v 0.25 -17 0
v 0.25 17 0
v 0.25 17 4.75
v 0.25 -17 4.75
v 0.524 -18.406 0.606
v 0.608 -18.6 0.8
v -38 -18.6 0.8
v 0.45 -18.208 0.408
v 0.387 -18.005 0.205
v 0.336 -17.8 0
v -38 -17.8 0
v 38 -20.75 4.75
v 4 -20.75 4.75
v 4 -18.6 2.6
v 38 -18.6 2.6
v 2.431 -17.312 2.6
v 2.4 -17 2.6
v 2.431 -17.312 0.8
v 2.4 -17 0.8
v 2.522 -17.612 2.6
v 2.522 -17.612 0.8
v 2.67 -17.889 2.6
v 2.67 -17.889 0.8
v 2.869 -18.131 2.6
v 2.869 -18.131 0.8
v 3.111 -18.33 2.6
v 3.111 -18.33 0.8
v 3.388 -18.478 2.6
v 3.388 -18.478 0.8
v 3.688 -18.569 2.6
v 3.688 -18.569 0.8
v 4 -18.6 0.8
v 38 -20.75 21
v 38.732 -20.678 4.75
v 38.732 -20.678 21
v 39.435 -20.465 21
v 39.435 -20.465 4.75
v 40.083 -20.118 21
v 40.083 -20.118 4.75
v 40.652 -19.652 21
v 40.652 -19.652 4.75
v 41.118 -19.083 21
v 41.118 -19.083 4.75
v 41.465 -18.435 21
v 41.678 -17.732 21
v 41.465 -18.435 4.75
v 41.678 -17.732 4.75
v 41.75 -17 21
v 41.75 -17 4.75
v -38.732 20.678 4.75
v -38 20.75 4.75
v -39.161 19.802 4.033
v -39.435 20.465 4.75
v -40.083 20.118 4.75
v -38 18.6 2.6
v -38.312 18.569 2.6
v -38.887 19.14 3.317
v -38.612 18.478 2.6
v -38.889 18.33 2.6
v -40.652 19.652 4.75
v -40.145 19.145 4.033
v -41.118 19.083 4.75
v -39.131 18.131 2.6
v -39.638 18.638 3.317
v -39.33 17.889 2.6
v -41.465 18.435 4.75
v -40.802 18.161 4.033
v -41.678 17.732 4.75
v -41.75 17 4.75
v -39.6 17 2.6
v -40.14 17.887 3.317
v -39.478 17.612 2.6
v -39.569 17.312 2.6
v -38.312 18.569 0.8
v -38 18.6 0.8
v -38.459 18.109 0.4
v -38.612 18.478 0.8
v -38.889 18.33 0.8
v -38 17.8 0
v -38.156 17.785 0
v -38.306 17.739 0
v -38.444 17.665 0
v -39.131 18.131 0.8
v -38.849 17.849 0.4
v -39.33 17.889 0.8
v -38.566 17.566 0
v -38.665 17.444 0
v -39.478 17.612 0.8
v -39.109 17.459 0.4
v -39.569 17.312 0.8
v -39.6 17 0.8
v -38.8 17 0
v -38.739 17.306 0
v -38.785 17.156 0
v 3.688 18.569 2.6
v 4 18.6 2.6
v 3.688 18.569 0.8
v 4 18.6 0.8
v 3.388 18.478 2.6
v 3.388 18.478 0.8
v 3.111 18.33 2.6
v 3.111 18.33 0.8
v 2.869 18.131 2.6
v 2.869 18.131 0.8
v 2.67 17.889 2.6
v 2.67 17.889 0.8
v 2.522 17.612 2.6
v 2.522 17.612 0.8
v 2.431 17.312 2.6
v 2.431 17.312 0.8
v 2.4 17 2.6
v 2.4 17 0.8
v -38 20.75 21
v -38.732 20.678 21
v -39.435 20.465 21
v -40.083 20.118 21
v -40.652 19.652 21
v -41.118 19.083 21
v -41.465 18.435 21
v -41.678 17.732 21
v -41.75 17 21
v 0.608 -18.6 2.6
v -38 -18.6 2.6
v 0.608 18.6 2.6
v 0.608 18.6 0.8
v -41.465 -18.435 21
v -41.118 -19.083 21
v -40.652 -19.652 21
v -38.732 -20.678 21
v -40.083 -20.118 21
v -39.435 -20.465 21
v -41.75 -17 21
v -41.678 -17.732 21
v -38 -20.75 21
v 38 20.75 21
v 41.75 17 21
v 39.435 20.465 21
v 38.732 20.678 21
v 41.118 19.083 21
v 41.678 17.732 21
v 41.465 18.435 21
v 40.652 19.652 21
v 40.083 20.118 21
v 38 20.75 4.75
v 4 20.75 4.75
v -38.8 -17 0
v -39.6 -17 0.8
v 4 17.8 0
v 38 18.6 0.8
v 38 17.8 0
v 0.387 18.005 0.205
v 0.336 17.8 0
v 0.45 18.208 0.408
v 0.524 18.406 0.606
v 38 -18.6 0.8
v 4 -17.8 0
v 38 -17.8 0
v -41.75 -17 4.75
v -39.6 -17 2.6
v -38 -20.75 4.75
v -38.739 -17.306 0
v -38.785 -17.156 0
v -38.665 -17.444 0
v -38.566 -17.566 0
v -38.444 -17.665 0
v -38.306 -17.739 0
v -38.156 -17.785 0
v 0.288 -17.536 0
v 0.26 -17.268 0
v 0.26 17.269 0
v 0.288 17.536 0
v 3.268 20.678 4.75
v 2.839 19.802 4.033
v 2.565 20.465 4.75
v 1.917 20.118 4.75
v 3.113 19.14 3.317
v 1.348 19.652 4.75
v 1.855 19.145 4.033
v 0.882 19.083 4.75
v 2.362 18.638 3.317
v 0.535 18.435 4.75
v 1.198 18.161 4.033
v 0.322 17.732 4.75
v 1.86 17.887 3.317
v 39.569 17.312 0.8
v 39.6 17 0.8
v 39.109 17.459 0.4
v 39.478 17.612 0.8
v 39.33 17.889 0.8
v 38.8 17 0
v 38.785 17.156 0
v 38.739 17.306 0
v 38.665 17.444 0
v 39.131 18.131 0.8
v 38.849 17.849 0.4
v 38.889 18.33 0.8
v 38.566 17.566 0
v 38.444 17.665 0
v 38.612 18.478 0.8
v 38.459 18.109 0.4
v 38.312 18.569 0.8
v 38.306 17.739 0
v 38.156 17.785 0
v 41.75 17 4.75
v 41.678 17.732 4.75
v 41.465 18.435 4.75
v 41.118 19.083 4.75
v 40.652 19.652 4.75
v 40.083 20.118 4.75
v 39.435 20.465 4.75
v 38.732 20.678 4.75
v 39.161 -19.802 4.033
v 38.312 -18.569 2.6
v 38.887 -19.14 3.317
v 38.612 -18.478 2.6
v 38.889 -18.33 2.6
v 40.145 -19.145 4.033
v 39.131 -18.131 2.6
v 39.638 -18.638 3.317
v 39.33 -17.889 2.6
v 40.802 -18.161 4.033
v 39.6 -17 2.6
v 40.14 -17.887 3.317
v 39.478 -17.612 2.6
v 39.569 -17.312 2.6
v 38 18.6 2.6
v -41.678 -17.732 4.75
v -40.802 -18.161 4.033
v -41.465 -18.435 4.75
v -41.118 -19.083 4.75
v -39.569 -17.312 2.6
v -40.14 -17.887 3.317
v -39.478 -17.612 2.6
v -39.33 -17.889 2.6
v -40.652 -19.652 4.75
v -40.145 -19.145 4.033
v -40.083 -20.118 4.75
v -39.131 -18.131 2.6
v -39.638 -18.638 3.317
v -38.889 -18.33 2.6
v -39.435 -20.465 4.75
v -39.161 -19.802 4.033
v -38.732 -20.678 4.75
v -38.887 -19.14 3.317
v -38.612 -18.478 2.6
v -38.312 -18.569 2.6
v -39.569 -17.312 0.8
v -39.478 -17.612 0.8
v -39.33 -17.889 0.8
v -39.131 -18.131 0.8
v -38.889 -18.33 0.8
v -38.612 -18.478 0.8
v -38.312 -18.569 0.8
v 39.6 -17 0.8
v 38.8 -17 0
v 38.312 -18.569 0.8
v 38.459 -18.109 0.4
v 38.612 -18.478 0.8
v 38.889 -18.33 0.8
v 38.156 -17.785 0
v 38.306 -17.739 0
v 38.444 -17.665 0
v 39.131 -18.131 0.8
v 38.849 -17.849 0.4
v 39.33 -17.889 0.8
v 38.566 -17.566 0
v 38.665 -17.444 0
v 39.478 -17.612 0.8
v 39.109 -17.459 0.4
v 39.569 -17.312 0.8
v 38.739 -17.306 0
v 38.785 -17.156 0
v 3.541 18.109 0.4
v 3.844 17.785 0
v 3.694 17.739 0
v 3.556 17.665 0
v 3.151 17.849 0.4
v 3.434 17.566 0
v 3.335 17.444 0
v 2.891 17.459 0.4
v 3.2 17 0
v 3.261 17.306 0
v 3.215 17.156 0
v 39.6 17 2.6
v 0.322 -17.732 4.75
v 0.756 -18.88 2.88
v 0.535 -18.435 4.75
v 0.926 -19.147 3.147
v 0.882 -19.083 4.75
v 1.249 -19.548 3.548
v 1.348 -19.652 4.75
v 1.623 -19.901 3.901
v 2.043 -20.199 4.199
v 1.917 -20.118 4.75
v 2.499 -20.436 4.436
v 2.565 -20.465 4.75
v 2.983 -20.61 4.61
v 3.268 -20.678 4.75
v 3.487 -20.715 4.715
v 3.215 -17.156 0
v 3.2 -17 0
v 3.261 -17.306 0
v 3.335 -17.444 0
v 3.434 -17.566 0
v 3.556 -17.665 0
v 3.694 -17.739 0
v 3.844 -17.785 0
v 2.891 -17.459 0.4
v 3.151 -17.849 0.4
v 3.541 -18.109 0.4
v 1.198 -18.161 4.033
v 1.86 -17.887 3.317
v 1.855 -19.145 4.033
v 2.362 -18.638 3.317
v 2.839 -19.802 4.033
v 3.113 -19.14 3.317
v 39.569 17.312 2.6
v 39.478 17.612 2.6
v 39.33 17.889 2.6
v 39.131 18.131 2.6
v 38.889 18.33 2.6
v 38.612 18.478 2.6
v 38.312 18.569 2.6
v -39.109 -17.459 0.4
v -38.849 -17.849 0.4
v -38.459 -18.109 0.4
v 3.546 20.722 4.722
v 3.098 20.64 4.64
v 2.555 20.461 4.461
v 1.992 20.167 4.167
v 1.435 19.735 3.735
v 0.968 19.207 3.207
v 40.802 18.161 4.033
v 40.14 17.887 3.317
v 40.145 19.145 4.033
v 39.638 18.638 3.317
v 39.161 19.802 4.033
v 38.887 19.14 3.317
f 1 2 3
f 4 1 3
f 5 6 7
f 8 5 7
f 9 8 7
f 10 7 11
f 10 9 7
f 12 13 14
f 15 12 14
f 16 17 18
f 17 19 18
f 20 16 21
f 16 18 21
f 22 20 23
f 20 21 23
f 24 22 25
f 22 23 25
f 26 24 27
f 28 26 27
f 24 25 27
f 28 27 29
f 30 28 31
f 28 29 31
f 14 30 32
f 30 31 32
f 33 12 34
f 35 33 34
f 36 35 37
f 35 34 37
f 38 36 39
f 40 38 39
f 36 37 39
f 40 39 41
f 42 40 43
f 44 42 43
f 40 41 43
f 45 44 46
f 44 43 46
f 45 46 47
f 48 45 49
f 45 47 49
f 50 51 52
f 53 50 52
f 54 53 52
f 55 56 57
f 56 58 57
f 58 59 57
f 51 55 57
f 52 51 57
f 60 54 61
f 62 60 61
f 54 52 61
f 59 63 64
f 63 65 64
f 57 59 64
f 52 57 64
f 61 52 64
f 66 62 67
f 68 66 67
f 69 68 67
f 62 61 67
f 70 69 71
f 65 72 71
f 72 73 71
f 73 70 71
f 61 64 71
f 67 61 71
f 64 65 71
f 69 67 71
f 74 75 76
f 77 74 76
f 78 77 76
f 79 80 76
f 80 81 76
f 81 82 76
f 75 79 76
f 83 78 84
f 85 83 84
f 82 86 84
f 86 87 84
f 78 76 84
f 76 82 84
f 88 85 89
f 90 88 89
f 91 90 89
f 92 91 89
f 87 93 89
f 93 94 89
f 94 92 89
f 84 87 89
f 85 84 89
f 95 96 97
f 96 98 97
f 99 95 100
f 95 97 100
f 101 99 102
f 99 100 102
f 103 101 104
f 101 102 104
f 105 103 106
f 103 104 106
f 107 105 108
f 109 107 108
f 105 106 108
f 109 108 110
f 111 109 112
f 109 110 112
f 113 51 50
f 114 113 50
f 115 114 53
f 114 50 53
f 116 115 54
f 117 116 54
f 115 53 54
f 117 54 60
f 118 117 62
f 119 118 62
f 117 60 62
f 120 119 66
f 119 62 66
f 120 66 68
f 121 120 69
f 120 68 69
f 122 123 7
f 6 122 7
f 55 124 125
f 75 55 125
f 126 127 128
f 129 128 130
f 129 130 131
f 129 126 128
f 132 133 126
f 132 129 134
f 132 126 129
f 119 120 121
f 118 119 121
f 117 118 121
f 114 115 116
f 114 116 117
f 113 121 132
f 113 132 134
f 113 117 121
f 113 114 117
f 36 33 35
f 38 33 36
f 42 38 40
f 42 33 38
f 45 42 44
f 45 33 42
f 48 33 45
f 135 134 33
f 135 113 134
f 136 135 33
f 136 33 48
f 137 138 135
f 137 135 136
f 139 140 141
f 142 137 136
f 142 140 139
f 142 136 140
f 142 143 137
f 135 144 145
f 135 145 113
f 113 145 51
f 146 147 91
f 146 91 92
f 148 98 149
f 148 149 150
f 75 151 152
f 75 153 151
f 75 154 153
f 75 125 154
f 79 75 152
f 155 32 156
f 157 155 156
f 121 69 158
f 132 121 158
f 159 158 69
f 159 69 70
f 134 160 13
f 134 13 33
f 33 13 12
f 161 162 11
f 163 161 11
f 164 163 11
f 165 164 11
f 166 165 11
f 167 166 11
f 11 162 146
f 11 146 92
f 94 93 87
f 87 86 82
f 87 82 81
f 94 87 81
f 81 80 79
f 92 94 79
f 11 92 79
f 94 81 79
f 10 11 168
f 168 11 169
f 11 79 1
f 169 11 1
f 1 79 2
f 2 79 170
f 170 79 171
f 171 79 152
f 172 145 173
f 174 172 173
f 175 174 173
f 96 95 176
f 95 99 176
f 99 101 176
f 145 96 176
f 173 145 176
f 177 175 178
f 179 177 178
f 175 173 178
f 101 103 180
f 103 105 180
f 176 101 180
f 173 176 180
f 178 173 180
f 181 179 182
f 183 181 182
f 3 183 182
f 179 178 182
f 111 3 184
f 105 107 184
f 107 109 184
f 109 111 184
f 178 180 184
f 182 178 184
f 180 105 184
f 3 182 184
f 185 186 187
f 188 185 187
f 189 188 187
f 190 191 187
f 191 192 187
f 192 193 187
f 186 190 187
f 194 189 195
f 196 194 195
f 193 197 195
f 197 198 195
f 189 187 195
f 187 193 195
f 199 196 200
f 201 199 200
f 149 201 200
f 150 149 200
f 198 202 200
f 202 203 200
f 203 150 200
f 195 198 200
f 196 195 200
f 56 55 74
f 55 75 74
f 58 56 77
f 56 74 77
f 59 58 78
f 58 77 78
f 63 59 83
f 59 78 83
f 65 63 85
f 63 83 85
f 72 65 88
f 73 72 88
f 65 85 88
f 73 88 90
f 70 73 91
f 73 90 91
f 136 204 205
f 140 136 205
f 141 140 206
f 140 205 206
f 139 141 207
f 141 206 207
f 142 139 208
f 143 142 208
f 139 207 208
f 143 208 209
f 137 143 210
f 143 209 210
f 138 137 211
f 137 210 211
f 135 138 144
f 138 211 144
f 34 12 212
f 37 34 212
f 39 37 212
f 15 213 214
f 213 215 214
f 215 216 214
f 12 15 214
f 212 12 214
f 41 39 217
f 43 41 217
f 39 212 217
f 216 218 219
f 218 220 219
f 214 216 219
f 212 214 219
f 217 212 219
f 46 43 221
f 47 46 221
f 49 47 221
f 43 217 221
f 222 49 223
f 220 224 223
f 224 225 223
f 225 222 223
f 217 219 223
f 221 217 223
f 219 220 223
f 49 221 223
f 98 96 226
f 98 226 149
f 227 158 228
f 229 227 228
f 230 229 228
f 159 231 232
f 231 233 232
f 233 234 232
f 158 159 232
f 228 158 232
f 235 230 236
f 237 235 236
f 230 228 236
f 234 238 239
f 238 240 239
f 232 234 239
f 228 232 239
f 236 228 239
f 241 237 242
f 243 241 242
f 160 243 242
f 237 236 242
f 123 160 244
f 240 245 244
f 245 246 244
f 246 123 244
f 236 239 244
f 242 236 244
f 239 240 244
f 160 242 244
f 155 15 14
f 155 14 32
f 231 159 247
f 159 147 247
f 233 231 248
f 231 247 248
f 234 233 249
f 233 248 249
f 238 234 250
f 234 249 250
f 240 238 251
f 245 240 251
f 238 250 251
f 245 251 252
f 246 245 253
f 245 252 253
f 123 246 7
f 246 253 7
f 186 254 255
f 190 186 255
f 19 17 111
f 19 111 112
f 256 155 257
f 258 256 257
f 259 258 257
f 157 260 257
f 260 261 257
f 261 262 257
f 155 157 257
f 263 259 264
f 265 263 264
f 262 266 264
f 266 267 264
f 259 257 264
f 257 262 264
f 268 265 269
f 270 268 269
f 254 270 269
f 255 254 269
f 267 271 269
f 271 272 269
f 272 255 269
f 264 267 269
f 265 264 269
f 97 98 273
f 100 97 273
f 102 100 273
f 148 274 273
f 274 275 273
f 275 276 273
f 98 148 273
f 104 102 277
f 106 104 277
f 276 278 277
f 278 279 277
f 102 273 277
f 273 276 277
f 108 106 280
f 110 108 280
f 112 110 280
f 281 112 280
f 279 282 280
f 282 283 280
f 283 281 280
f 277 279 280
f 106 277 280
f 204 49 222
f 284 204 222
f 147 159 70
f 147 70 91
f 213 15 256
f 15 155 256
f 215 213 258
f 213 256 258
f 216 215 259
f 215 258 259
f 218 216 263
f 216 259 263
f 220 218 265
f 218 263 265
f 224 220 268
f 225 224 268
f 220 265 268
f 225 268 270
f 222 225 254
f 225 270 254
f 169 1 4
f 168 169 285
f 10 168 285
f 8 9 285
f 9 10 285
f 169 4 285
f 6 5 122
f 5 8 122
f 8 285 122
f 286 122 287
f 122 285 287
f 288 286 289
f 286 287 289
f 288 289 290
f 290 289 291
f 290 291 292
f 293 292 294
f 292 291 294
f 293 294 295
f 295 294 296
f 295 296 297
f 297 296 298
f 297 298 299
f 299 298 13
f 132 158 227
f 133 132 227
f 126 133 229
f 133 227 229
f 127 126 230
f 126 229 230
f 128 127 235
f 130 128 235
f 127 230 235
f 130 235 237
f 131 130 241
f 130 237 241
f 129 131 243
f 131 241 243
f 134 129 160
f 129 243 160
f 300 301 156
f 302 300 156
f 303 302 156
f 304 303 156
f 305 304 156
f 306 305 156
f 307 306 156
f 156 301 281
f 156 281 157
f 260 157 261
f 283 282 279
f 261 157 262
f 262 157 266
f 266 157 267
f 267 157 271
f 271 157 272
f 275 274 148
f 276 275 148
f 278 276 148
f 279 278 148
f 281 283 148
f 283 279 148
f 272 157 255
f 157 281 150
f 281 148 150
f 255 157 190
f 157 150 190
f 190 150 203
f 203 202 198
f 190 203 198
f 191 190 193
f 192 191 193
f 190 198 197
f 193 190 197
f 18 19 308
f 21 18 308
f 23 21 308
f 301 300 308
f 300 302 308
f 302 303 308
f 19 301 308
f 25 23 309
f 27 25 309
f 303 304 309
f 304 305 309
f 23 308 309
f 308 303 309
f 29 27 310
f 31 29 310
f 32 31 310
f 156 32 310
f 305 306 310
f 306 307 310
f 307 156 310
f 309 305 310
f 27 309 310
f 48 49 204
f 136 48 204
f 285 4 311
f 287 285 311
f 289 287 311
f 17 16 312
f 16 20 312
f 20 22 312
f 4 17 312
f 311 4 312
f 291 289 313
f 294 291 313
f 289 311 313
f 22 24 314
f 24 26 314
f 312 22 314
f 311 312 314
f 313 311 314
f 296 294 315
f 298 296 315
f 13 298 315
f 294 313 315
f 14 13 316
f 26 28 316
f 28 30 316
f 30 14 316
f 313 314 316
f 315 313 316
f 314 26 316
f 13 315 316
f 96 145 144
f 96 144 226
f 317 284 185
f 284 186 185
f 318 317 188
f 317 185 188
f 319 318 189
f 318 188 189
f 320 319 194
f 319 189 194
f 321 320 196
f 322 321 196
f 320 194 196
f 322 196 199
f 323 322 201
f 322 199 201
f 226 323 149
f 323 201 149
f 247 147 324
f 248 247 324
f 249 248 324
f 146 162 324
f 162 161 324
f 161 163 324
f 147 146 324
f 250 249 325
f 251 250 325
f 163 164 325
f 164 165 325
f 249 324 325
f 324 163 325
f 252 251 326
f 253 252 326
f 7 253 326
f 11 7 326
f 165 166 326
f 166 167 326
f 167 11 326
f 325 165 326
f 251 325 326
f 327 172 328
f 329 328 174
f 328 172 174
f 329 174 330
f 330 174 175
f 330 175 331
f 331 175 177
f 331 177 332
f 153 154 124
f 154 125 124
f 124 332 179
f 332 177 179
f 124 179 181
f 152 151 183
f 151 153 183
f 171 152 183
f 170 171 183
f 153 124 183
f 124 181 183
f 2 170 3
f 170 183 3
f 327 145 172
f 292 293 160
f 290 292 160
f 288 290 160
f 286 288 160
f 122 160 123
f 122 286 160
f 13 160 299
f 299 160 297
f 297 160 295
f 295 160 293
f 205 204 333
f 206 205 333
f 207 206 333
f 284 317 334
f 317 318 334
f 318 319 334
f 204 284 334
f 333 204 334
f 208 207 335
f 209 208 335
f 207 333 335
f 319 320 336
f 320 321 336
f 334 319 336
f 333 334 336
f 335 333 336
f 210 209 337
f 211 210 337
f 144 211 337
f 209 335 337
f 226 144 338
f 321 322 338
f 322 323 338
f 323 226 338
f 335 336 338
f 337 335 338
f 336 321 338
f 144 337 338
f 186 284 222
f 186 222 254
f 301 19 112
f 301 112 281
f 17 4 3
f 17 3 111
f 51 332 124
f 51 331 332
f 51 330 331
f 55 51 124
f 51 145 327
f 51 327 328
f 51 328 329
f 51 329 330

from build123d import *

# Parameters (mm, degrees)
PAD001_DEPTH           = 21
LINEARPATTERN002_COUNT = 2
LINEARPATTERN002_PITCH = 42


with BuildPart() as part:
    # Sketch004 → Pad001 (new body)
    with BuildSketch(Plane.XY):
        with BuildLine():
            Line((-38, -20.75), (38, -20.75))
            ThreePointArc((38, -20.75), (40.65165, -19.65165), (41.75, -17))
            Line((41.75, -17), (41.75, 17))
            ThreePointArc((41.75, 17), (40.65165, 19.65165), (38, 20.75))
            Line((38, 20.75), (-38, 20.75))
            ThreePointArc((-38, 20.75), (-40.65165, 19.65165), (-41.75, 17))
            Line((-41.75, 17), (-41.75, -17))
            ThreePointArc((-41.75, -17), (-40.65165, -19.65165), (-38, -20.75))
        make_face()
    extrude(amount=PAD001_DEPTH)

    # SubtractivePipe001: sweep along a path in Sketch004
    with BuildLine(Plane.XY) as subtractivepipe001_path:
        Line((-38, -20.75), (38, -20.75))
        ThreePointArc((38, -20.75), (40.65165, -19.65165), (41.75, -17))
        Line((41.75, -17), (41.75, 17))
        ThreePointArc((41.75, 17), (40.65165, 19.65165), (38, 20.75))
        Line((38, 20.75), (-38, 20.75))
        ThreePointArc((-38, 20.75), (-40.65165, 19.65165), (-41.75, 17))
        Line((-41.75, 17), (-41.75, -17))
        ThreePointArc((-41.75, -17), (-40.65165, -19.65165), (-38, -20.75))
    # Sketch005 → SubtractivePipe001 (sweep, cut)
    with BuildSketch(Plane.XZ):
        Polygon((41.75, 4.75), (39.6, 2.6), (39.6, 0.8), (38.8, 0), (41.75, 0), align=None)
    subtractivepipe001 = sweep(path=subtractivepipe001_path.line, mode=Mode.SUBTRACT)

    # LinearPattern002: SubtractivePipe001 ×2
    with Locations(*[(i * LINEARPATTERN002_PITCH, 0, 0) for i in range(1, LINEARPATTERN002_COUNT)]):
        add(subtractivepipe001, mode=Mode.SUBTRACT)


solid = part.part
